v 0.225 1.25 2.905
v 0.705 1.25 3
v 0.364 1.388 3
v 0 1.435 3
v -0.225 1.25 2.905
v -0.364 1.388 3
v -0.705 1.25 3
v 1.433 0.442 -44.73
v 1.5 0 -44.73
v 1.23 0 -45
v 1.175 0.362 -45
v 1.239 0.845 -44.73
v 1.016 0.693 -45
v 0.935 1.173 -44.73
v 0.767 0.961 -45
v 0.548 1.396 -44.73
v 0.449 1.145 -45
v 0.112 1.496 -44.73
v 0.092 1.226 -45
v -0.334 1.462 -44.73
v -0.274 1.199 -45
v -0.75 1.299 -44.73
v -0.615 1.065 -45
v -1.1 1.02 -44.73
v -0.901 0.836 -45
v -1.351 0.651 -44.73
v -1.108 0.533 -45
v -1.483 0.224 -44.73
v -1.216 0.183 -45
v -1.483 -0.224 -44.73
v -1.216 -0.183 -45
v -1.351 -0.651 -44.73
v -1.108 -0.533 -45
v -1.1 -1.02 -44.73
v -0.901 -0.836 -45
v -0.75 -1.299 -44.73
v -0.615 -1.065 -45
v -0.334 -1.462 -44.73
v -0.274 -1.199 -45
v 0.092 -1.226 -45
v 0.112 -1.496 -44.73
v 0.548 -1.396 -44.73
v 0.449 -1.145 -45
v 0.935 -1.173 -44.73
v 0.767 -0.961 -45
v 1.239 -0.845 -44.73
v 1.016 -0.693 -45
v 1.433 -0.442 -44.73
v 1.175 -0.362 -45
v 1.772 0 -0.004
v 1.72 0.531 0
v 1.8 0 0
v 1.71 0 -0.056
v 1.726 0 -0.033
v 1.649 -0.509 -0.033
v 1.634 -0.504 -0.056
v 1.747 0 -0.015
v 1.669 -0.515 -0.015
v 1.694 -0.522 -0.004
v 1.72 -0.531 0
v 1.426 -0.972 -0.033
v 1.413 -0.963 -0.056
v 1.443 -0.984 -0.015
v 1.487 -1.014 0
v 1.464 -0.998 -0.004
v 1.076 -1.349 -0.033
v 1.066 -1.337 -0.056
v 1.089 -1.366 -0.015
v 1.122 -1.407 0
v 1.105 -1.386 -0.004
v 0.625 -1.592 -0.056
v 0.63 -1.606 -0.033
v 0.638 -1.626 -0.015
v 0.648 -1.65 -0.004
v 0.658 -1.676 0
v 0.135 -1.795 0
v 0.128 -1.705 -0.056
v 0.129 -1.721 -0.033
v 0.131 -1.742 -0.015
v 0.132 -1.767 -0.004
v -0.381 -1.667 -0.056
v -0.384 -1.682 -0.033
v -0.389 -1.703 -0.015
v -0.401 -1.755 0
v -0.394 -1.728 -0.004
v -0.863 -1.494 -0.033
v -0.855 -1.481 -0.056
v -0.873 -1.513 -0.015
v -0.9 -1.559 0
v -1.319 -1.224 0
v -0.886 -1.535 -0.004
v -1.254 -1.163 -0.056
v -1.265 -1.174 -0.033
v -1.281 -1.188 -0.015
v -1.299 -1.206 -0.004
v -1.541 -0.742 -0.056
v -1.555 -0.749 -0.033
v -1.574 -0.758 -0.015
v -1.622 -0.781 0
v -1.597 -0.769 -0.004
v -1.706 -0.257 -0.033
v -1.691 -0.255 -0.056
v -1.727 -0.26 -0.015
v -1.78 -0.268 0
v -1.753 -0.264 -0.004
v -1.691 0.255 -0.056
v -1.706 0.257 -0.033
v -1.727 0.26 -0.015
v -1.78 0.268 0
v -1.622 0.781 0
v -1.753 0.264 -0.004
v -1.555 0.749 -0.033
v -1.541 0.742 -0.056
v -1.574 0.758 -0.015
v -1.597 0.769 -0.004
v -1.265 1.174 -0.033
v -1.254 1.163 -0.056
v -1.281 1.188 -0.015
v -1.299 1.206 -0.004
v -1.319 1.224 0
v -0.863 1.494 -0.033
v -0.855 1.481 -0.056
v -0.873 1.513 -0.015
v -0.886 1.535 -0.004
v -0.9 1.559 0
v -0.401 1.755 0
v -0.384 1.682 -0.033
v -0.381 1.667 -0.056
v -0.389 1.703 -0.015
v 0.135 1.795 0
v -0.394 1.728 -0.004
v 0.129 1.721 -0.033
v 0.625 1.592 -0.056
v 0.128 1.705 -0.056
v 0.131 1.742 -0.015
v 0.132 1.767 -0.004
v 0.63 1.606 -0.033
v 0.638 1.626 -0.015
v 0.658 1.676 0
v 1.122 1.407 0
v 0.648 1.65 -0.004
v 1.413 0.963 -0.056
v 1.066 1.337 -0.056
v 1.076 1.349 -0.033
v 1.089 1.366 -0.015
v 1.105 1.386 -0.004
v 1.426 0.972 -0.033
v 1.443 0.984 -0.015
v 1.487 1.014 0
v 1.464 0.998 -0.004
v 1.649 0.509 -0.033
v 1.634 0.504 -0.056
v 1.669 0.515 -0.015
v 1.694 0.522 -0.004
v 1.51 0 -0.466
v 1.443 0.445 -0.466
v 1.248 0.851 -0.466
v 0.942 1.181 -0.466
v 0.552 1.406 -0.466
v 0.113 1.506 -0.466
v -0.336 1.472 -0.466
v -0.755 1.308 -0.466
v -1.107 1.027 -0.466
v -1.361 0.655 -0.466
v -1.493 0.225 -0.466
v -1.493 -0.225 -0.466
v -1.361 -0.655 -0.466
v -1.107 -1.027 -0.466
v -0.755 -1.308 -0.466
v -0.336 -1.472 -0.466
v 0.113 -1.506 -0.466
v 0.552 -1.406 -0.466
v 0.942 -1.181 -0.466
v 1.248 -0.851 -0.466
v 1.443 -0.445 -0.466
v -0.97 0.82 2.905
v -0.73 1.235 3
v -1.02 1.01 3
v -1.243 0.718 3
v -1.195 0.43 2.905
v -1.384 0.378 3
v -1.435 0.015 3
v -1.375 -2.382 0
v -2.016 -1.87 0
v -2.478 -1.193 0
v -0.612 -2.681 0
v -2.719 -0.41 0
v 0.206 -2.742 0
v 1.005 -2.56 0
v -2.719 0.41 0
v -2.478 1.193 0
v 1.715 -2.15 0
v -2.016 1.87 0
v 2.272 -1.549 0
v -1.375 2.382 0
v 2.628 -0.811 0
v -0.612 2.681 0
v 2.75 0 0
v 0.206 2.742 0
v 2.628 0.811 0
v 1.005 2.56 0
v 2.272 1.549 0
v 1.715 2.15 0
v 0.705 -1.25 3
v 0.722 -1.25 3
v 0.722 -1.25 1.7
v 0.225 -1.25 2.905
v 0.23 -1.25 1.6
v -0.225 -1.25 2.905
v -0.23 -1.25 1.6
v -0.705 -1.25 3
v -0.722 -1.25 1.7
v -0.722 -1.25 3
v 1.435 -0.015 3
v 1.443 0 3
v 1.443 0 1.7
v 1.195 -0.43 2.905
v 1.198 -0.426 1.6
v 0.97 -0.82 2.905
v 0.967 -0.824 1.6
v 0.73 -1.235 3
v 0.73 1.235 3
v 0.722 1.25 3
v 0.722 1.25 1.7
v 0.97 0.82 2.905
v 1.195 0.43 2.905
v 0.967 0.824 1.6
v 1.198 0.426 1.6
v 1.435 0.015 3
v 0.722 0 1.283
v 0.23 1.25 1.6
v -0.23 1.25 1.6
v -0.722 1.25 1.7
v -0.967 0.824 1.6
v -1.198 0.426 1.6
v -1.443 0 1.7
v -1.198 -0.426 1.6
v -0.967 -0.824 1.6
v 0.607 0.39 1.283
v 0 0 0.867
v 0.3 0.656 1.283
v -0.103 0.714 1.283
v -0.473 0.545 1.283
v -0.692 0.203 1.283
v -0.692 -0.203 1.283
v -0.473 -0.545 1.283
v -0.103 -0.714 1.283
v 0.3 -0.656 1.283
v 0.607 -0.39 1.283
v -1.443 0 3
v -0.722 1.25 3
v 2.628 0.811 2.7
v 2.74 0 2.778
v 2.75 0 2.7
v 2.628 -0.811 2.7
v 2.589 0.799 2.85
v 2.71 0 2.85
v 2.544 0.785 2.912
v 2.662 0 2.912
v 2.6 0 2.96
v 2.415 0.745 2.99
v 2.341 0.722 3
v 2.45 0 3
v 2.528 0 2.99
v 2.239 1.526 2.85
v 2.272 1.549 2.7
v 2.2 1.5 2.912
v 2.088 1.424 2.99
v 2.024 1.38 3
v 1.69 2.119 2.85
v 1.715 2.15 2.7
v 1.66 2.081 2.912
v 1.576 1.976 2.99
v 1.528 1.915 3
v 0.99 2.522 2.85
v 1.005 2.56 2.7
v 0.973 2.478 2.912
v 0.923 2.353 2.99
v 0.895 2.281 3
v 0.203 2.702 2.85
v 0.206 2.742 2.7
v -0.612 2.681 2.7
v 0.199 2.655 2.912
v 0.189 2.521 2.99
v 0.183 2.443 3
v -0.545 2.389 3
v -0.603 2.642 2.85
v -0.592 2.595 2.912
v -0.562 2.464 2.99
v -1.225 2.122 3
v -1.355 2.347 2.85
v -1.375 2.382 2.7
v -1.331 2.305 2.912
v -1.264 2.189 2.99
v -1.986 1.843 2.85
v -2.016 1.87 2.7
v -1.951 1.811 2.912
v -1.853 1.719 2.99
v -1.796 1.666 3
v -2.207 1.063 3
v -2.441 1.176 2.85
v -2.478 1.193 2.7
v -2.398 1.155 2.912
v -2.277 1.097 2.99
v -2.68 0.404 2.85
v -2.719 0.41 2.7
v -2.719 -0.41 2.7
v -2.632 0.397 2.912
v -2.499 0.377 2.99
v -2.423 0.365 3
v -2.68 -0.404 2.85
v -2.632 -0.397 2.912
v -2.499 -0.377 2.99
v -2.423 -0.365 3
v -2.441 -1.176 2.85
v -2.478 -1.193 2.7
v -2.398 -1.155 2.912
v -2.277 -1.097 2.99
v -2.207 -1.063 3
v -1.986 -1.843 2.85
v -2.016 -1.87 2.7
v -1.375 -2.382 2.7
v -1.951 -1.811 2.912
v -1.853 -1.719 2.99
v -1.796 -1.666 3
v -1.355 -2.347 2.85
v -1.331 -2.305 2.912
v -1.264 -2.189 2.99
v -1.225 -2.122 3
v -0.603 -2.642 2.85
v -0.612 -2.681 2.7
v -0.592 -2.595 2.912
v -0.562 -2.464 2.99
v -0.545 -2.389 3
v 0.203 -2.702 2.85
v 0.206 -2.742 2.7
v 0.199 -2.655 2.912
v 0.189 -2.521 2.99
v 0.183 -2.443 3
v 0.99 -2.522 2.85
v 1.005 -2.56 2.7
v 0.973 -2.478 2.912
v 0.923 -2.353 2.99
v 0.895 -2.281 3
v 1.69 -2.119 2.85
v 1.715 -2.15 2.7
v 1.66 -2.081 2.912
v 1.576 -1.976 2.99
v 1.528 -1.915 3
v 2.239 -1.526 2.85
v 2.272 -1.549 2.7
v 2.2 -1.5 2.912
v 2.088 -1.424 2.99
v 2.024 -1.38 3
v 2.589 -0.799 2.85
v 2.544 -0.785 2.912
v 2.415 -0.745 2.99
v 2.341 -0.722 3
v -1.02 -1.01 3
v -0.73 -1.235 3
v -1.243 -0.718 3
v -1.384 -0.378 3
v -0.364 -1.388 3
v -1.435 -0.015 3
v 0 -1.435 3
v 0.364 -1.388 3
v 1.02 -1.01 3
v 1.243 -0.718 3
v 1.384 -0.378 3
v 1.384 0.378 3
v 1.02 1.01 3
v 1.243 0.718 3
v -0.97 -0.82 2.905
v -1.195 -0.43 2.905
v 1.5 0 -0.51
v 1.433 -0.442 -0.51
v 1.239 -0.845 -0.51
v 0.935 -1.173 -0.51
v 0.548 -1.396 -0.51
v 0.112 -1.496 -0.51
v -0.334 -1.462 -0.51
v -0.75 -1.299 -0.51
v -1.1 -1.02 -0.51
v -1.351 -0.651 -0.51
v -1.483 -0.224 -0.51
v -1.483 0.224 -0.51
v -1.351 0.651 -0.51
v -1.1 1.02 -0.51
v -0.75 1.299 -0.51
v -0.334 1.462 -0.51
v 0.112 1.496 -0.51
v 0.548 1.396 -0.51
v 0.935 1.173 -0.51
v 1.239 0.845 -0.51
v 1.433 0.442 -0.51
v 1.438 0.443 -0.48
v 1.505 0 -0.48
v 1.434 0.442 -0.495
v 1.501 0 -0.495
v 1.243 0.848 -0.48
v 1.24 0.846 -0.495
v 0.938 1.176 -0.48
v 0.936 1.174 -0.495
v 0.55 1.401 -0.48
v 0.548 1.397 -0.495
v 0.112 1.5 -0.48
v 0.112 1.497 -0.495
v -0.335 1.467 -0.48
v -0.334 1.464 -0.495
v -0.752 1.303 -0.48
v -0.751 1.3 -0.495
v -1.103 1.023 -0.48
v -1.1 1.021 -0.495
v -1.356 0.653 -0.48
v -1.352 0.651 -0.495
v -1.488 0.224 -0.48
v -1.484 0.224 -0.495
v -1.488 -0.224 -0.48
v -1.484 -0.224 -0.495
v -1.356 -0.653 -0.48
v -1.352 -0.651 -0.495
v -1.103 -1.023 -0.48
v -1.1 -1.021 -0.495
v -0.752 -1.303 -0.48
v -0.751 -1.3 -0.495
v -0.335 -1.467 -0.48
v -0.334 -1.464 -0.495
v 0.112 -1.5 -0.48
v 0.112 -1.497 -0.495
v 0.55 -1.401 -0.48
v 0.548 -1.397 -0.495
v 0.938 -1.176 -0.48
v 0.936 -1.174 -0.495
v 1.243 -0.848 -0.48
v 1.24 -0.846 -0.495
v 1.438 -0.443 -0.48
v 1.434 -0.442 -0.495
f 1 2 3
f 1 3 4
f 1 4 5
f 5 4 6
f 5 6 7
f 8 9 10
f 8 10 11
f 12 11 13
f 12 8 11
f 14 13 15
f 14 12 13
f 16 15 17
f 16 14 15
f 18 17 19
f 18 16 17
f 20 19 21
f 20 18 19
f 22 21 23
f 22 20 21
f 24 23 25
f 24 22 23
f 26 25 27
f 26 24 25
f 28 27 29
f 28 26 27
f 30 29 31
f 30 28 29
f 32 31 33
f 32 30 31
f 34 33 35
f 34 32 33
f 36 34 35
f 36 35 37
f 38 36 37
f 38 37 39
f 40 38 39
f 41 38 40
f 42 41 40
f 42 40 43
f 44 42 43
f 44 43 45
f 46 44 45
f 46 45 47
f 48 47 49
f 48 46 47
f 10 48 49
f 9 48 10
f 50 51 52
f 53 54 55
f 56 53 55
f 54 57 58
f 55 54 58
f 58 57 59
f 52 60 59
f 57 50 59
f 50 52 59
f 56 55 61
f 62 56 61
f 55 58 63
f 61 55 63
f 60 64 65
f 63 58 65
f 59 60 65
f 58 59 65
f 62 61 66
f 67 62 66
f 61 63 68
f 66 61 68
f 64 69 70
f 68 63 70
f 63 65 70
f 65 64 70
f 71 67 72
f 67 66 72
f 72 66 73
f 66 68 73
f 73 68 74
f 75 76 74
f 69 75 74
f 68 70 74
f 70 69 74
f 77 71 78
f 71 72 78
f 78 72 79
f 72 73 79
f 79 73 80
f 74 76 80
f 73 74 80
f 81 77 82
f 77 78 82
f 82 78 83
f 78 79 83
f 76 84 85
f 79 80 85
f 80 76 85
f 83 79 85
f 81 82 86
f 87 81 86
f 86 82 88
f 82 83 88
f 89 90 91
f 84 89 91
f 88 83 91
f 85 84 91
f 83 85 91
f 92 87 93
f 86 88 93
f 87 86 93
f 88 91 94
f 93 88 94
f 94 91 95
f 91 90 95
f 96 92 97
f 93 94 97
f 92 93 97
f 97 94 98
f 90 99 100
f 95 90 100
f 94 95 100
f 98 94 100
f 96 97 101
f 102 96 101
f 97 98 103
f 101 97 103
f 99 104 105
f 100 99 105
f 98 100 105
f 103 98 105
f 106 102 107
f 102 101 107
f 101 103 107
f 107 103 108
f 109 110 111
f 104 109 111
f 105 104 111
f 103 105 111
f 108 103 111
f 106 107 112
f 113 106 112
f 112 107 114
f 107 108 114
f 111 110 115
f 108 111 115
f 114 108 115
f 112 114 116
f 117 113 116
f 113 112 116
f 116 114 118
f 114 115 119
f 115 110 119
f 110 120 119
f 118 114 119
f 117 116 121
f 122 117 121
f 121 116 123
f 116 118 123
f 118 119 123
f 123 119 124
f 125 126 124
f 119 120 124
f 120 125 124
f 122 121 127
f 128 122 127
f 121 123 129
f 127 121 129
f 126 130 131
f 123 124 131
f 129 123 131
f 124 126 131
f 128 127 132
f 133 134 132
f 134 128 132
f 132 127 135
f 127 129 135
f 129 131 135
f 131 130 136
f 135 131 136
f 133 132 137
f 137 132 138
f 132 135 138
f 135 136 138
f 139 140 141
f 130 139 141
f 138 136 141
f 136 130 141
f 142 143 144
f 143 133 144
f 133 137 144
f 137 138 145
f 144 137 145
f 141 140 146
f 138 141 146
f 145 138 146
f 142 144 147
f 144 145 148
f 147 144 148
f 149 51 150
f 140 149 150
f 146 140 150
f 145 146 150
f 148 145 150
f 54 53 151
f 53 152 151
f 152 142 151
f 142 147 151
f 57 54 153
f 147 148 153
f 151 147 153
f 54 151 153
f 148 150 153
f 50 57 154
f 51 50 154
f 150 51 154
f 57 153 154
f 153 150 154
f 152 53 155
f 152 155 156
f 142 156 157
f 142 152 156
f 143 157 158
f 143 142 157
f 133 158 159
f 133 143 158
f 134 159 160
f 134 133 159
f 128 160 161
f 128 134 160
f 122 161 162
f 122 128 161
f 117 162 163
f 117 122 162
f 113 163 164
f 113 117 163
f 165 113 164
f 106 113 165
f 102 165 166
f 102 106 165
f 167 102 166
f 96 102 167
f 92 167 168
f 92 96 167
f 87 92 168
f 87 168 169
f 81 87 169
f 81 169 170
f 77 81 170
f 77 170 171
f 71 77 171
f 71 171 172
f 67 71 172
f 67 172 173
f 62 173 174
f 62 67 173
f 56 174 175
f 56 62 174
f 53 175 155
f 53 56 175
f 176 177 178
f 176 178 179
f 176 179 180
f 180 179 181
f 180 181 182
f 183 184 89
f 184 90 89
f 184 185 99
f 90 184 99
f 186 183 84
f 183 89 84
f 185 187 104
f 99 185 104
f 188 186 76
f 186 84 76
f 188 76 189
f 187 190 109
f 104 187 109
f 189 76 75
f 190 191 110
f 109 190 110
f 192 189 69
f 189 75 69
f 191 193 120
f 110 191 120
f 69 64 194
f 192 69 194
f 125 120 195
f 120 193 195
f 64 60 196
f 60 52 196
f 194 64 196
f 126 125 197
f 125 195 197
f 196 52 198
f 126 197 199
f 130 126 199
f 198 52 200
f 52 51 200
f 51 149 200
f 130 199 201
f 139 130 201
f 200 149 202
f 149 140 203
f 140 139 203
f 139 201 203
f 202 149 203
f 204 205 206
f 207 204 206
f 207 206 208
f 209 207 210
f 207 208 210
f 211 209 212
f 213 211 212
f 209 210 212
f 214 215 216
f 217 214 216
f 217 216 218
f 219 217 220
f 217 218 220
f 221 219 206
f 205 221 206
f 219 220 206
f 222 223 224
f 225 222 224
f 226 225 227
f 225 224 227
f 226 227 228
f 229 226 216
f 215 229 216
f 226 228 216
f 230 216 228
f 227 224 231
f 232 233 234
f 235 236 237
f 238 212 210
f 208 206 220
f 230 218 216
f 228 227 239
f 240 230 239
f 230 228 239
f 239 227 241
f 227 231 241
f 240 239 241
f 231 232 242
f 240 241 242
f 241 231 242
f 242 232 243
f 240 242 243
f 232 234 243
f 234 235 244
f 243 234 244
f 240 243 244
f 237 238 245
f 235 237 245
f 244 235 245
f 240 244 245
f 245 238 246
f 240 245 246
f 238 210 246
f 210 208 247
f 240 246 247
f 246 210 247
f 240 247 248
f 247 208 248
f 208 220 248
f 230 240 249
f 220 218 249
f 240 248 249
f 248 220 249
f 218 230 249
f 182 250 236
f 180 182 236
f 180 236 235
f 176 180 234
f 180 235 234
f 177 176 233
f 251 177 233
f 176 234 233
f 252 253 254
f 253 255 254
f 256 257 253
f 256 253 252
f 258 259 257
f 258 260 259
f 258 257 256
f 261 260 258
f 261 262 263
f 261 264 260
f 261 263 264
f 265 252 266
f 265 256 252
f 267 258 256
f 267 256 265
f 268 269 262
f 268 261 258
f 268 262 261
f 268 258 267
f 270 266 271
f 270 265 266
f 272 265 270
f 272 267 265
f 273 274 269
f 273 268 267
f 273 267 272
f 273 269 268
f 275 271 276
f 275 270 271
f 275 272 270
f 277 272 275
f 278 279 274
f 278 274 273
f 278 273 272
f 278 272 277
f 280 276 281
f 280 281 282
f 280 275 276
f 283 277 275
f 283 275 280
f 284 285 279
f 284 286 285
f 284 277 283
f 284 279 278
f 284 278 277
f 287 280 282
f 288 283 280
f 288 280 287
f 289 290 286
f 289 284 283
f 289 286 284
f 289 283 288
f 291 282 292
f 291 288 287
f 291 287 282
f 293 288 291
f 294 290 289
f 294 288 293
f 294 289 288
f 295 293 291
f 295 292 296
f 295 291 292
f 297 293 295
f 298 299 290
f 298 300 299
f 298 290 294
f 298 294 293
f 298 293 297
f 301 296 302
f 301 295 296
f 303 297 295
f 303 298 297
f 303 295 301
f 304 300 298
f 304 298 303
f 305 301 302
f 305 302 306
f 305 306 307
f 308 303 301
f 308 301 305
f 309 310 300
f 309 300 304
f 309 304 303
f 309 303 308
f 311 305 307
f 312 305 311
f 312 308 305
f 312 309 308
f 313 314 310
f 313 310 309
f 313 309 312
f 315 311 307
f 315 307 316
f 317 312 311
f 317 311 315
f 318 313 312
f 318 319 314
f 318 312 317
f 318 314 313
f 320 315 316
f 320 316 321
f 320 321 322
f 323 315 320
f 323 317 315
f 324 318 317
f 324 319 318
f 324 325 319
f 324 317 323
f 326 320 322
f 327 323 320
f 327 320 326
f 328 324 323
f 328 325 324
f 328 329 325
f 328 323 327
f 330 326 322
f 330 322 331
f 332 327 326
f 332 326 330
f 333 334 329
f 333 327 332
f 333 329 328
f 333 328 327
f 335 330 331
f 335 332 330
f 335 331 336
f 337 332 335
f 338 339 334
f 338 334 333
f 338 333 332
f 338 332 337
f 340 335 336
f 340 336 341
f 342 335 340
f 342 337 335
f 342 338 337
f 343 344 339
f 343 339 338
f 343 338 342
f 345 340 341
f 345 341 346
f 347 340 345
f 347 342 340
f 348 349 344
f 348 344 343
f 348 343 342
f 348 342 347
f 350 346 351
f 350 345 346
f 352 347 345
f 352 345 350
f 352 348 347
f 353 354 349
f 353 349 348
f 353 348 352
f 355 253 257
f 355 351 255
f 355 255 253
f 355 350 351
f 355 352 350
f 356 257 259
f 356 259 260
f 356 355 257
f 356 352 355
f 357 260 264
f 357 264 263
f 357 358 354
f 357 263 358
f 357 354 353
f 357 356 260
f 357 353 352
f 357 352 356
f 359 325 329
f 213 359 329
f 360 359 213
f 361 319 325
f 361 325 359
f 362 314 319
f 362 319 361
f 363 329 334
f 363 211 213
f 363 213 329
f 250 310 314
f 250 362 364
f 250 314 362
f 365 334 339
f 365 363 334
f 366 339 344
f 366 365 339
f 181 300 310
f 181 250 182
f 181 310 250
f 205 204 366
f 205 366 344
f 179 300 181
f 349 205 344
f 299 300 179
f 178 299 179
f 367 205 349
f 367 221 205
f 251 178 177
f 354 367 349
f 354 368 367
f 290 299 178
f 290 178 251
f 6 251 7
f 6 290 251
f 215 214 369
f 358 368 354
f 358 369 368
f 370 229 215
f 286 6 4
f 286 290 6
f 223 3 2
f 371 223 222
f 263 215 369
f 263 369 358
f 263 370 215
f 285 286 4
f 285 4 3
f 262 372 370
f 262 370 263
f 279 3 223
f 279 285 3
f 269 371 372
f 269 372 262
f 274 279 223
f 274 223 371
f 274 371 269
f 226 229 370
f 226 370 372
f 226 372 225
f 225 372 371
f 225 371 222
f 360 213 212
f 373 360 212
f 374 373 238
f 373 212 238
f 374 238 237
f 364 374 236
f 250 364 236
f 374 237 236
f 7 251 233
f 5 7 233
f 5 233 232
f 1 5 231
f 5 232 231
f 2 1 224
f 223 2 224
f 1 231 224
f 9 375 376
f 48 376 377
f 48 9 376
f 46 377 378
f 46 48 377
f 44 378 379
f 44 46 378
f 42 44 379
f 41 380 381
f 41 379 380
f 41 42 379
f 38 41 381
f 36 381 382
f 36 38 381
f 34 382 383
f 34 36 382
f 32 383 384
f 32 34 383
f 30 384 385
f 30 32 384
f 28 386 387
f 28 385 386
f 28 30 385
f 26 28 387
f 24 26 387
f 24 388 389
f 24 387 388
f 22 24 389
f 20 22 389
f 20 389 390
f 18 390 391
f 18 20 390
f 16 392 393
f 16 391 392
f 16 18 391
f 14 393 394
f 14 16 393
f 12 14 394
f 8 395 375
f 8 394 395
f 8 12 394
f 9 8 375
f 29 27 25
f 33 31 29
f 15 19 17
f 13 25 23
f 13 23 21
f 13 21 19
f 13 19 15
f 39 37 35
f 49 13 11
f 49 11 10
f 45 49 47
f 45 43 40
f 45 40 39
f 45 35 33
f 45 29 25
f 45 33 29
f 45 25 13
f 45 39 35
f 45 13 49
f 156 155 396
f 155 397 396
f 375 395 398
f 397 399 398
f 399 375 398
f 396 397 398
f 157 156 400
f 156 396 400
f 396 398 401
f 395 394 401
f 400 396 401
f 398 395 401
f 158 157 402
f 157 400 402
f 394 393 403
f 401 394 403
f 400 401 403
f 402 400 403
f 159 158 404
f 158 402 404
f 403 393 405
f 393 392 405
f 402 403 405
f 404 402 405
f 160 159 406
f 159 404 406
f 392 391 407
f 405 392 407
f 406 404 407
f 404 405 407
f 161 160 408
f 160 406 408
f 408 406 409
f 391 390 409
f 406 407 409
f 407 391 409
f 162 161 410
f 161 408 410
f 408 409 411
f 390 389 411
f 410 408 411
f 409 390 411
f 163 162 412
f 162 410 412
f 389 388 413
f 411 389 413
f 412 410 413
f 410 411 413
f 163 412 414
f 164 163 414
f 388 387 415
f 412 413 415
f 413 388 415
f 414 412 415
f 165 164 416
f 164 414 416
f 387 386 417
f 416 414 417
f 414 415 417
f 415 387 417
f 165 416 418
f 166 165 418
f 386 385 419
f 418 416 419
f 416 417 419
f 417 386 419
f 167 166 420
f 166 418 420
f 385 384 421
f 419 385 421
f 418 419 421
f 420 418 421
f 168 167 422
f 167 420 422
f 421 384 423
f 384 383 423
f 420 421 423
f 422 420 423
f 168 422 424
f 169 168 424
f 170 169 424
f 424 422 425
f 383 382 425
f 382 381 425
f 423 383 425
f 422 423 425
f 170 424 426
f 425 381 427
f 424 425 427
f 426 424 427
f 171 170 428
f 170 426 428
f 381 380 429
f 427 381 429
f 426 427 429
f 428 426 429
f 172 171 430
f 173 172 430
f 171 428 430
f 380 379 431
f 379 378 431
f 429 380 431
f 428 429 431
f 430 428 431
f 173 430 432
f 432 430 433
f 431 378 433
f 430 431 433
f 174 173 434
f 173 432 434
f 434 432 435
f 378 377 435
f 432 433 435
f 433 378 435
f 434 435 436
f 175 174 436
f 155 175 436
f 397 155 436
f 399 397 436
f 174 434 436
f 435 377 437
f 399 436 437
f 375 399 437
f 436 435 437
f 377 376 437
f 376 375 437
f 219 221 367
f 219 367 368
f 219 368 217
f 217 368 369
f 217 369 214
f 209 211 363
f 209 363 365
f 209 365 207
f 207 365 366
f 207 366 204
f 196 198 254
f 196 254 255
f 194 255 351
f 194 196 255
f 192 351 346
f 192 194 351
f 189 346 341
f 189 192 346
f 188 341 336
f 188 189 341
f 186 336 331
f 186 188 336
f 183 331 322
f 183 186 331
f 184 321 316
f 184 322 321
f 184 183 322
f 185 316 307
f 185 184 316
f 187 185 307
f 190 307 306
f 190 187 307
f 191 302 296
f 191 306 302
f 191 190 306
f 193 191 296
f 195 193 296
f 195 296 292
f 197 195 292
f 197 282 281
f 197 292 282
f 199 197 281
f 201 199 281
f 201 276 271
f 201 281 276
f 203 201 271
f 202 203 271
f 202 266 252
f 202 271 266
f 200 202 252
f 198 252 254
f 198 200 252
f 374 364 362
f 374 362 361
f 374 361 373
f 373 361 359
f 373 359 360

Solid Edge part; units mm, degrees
sketch "Sketch1" plane through (0, 0, 0) normal (0, 0, 1) x (1, 0, 0)
  line L0 (-0.7217, 1.25) -> (0.7217, 1.25)
  line L1 (0.7217, 1.25) -> (1.4434, 0)
  line L2 (1.4434, 0) -> (0.7217, -1.25)
  line L3 (0.7217, -1.25) -> (-0.7217, -1.25)
  line L4 (-0.7217, -1.25) -> (-1.4434, 0)
  line L5 (-1.4434, 0) -> (-0.7217, 1.25)
  circle A0 centre (0, 0) radius 2.75
  dimension "D1" = 5.5
  dimension "D2" = 2.5
extrude "Protrusion1" add sketch "Sketch1" along normal blind 3
sketch "Sketch2" plane through (0, 0, 0) normal (0, -1, 0) x (1, 0, 0)
  line L0 (0, 0.8667) -> (1.4434, 1.7)
  line L1 (1.4434, 1.7) -> (2.75, 1.7)
  line L2 (2.75, 1.7) -> (2.75, 0)
  line L3 (2.75, 0) -> (1.5, 0)
  line L4 (1.5, 0) -> (1.5, -26.999)
  line L5 (1.5, -26.999) -> (1.5, -27) construction
  line L6 (1.5, -27) -> (1.5, -27) construction
  line L7 (1.5, -27) -> (1.5, -45)
  line L8 (0, -45) -> (1.5, -45)
  dimension "D1" = 18
  dimension "D2" = 1.5
  dimension "D3" = 1.5
  dimension "D4" = 2.75
  dimension "D5" = 1.7
  dimension "D6" = 46.7
  dimension "D7" = 0.001
  dimension "D8" = 1.25
  dimension "D9" = 1.25
revolve "RevolvedProtrusion_1" add sketch "Sketch2" angle 360 about axis through (0, 0, 2.3333) along (0, 0, -1)
cosmetic_thread "Thread_1" size "M3" thread depth 17.999
sketch "Sketch3" plane through (0, 0, 0) normal (0, -1, 0) x (1, 0, 0)
  line L0 (0, 4) -> (1.435, 4)
  line L1 (1.435, 4) -> (1.435, 3)
  line L2 (1.435, 3) -> (0, 2.1715)
  dimension "D1" = 1.435
  dimension "D2" = 1
  dimension "D3" = 4
revolve "RevolvedCutout_1" cut sketch "Sketch3" angle 360 about axis through (0, 0, 7.1999) along (0, 0, 1)
fillet "Round_1" radius 0.3 1 edges at (-2.75, 0, 3)
sketch "Sketch4" plane through (0, 0, 0) normal (0, -1, 0) x (1, 0, 0)
  line L0 (1.5, 0) -> (1.8, 0)
  arc A0 (1.7101, -0.0562) -> (1.8, 0) centre (1.8, -0.1) cw
  line L1 (1.5101, -0.4662) -> (1.7101, -0.0562)
  arc A1 (1.5101, -0.4662) -> (1.5, -0.51) centre (1.6, -0.51) ccw
  line L2 (1.5, 0) -> (1.5, -0.51)
  dimension "D1" = 0.51
  dimension "D2" = 1.5
  dimension "D3" = 0.51
  dimension "D4" = 0.3
  dimension "D5" = 0.1
revolve "RevolvedProtrusion_2" add sketch "Sketch4" angle 360 about axis through (0, 0, -1.02) along (0, 0, 1)
chamfer "Chamfer_1" distance 0.2705 angle 45 1 edges at (-1.5, 0, -45)
properties material "Steel"
